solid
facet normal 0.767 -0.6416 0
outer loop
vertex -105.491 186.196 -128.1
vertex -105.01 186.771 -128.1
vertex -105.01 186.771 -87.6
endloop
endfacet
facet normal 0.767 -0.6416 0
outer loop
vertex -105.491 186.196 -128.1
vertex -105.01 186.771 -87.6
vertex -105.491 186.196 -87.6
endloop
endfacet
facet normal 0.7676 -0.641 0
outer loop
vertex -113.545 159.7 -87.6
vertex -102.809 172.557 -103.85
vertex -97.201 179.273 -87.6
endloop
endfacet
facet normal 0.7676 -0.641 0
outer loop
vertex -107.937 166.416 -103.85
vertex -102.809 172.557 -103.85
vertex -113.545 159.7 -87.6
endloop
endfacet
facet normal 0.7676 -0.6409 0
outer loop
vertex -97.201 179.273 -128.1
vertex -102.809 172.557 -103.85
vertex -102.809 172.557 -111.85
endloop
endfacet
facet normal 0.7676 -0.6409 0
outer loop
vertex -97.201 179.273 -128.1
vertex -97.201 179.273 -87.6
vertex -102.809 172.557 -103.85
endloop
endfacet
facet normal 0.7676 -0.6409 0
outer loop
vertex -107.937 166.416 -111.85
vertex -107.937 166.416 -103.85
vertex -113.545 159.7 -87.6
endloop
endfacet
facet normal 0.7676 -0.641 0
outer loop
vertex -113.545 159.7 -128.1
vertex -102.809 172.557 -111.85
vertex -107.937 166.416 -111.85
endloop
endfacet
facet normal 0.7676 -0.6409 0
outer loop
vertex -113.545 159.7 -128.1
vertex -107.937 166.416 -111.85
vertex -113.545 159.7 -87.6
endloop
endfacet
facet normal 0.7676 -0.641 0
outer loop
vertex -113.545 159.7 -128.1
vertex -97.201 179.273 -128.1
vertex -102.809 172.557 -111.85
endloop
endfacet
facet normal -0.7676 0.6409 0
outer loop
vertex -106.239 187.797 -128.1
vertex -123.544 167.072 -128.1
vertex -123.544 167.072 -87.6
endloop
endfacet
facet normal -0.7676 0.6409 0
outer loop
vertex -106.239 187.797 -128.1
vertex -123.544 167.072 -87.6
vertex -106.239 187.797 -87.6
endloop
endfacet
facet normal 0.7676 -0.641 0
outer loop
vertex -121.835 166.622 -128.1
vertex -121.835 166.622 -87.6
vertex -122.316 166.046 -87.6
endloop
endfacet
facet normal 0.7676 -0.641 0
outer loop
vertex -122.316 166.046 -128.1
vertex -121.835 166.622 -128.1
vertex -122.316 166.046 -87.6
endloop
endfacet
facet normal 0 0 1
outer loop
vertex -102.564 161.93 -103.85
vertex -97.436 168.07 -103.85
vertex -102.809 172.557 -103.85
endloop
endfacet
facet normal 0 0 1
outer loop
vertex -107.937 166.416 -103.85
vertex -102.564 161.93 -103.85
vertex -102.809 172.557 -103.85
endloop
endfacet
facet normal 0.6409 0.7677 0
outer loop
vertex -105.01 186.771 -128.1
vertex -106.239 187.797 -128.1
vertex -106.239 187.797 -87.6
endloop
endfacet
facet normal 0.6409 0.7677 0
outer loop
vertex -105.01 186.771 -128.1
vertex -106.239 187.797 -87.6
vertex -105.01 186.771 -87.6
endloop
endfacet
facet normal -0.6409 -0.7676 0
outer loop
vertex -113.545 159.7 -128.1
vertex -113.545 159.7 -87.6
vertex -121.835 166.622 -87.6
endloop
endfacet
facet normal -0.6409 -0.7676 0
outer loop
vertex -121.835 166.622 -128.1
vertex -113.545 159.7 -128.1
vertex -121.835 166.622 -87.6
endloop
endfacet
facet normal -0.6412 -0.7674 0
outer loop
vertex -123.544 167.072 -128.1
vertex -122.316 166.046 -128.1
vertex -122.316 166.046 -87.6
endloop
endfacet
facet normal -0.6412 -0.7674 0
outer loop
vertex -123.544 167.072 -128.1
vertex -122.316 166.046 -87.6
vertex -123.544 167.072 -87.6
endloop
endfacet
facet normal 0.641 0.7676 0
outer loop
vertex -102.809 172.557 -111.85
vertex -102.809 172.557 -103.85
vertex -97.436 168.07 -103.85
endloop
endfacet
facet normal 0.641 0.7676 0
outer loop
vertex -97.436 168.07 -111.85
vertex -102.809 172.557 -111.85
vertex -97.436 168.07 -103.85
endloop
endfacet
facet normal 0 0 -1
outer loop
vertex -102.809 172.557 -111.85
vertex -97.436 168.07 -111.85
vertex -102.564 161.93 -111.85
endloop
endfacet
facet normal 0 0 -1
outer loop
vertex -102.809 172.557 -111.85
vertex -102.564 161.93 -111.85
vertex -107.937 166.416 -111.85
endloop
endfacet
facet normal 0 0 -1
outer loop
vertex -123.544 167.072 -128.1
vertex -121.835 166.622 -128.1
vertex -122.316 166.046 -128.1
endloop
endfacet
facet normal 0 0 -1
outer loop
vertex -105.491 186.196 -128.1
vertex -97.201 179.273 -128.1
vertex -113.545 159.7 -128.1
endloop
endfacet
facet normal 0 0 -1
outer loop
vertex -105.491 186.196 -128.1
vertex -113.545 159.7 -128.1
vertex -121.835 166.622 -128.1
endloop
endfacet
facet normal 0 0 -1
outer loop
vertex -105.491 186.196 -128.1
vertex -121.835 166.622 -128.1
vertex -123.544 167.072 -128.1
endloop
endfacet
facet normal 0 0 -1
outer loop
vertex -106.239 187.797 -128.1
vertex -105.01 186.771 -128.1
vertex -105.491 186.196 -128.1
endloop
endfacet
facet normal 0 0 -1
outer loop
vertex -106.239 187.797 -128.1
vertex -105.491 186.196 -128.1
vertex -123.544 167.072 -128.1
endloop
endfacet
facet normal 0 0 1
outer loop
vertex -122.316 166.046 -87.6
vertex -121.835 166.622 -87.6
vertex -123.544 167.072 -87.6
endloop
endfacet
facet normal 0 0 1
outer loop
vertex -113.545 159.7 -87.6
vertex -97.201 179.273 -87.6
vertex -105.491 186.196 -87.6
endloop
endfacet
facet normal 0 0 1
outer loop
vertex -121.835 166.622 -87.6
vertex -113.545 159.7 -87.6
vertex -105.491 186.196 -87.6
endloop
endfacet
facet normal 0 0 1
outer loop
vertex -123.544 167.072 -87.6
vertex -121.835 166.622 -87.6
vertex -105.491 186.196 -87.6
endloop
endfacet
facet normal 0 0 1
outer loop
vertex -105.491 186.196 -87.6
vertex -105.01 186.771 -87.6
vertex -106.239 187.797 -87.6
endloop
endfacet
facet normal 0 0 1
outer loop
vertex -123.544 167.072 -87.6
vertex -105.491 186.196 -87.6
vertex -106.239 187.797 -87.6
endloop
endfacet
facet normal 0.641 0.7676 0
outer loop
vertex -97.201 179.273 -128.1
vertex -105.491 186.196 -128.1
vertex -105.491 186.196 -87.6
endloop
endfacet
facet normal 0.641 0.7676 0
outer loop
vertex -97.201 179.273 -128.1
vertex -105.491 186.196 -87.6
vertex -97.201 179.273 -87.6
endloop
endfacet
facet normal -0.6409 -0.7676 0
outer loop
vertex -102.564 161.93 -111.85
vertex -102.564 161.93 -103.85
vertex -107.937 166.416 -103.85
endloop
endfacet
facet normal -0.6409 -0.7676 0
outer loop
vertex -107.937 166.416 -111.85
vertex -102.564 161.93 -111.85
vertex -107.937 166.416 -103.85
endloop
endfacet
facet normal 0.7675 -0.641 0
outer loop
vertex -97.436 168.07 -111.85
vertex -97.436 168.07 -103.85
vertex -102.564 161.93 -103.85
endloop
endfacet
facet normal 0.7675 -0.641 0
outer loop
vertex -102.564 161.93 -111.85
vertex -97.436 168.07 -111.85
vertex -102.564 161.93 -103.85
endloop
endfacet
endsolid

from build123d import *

# Parameters (mm, degrees)
MB_DEPTH    = 40.5
CAM_DEPTH   = 40.5
LENTE_DEPTH = 8


with BuildPart() as part:
    # Croquis_mb → MB (new body)
    with BuildSketch(Plane.XY.offset(-128.1)):
        Polygon((-123.543957493, 167.071730093), (-106.238601826, 187.796706939), (-105.01045505, 186.771204381), (-122.315810717, 166.046227535), align=None)
    extrude(amount=MB_DEPTH)

    # Croquis_cam → CAM (add)
    with BuildSketch(Plane.XY.offset(-128.1)):
        Polygon((-121.835106393, 166.621921336), (-105.491159374, 186.195510579), (-97.201168636, 179.273368313), (-113.545115654, 159.69977907), align=None)
    extrude(amount=CAM_DEPTH)

    # Croquis_lente → Lente (add)
    with BuildSketch(Plane.XY.offset(-103.85)):
        Polygon((-107.93689854, 166.416206751), (-102.80938575, 172.556940631), (-97.436243605, 168.07036694), (-102.563756395, 161.92963306), align=None)
    extrude(amount=-LENTE_DEPTH)


solid = part.part
